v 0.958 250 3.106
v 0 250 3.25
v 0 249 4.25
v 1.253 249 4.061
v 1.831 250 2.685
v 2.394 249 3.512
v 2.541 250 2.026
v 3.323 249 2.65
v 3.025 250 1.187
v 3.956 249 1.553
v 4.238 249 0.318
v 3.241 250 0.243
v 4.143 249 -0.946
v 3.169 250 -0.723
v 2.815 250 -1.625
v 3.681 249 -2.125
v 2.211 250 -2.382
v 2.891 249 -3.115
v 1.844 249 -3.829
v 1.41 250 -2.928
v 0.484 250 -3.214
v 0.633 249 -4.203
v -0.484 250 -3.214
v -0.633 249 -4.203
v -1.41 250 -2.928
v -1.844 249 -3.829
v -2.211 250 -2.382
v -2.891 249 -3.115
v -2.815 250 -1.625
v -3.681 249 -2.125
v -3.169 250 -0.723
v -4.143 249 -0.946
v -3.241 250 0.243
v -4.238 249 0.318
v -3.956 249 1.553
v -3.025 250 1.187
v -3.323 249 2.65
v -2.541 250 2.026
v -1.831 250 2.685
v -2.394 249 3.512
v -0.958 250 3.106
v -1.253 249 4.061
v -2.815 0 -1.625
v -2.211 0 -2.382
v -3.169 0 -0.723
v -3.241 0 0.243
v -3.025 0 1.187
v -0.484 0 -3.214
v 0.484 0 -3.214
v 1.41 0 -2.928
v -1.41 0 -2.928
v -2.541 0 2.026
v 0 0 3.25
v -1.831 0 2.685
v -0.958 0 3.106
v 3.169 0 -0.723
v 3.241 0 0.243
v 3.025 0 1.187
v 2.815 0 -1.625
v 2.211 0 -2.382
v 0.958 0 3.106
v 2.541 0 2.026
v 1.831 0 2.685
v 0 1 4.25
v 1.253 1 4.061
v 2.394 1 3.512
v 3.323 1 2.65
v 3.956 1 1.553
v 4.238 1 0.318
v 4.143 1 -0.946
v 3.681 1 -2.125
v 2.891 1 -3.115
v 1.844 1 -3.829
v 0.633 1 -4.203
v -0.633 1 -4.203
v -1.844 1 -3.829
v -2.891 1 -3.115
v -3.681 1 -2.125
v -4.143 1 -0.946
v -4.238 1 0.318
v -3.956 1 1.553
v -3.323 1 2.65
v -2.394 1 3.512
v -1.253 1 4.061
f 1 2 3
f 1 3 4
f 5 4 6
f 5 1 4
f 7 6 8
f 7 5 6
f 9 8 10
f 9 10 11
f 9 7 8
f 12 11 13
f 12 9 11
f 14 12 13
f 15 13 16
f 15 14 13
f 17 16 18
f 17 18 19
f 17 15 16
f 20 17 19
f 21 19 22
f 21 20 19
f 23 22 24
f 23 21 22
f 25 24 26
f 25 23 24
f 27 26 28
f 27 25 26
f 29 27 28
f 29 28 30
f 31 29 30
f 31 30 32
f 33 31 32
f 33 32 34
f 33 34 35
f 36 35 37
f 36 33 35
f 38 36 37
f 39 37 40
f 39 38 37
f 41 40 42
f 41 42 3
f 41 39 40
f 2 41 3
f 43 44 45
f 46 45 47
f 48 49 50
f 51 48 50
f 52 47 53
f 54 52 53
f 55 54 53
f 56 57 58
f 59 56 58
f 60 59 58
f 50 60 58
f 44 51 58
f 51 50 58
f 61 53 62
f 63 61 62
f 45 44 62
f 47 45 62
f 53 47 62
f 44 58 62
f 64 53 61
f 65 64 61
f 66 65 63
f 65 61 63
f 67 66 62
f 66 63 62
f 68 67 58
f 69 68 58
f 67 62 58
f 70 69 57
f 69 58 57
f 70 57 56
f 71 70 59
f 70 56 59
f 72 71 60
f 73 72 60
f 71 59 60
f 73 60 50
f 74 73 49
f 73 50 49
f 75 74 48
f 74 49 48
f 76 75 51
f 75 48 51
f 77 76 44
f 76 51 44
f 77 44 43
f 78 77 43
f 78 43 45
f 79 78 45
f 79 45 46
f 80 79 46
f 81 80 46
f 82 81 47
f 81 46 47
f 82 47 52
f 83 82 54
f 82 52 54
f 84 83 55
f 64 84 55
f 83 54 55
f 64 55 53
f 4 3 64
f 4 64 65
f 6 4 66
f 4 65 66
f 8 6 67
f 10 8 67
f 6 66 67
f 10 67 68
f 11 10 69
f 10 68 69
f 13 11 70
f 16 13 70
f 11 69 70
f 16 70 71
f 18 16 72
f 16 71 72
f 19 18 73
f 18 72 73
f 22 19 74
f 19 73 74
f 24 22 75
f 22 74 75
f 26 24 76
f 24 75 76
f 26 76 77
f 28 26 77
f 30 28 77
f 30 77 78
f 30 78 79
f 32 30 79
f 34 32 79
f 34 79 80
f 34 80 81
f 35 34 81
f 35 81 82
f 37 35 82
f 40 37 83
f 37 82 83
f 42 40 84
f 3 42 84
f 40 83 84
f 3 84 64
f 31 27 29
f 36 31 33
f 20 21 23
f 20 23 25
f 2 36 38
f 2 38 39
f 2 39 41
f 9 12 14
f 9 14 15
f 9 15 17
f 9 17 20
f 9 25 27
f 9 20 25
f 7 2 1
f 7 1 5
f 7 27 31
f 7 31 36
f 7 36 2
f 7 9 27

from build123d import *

# Parameters (mm, degrees)
SKETCH1_R      = 4.25
EXTRUDE1_DEPTH = 250
CHAMFER1_SIZE  = 1
CHAMFER2_SIZE  = 1


with BuildPart() as part:
    # Sketch1 → Extrude1 (new body)
    with BuildSketch(Plane(origin=(0, 0, 0), x_dir=(1, 0, 0), z_dir=(0, 1, 0))):
        with Locations(Location((0, 0, 0), (0, 0, 270))):
            Circle(SKETCH1_R)
    extrude(amount=EXTRUDE1_DEPTH)

    # Chamfer1
    chamfer1_edges = [part.edges().sort_by_distance(p)[0] for p in [
        (0, 250, -4.25),
    ]]
    chamfer(chamfer1_edges, length=CHAMFER1_SIZE)

    # Chamfer2
    chamfer2_edges = [part.edges().sort_by_distance(p)[0] for p in [
        (0, 0, -4.25),
    ]]
    chamfer(chamfer2_edges, length=CHAMFER2_SIZE)


solid = part.part
